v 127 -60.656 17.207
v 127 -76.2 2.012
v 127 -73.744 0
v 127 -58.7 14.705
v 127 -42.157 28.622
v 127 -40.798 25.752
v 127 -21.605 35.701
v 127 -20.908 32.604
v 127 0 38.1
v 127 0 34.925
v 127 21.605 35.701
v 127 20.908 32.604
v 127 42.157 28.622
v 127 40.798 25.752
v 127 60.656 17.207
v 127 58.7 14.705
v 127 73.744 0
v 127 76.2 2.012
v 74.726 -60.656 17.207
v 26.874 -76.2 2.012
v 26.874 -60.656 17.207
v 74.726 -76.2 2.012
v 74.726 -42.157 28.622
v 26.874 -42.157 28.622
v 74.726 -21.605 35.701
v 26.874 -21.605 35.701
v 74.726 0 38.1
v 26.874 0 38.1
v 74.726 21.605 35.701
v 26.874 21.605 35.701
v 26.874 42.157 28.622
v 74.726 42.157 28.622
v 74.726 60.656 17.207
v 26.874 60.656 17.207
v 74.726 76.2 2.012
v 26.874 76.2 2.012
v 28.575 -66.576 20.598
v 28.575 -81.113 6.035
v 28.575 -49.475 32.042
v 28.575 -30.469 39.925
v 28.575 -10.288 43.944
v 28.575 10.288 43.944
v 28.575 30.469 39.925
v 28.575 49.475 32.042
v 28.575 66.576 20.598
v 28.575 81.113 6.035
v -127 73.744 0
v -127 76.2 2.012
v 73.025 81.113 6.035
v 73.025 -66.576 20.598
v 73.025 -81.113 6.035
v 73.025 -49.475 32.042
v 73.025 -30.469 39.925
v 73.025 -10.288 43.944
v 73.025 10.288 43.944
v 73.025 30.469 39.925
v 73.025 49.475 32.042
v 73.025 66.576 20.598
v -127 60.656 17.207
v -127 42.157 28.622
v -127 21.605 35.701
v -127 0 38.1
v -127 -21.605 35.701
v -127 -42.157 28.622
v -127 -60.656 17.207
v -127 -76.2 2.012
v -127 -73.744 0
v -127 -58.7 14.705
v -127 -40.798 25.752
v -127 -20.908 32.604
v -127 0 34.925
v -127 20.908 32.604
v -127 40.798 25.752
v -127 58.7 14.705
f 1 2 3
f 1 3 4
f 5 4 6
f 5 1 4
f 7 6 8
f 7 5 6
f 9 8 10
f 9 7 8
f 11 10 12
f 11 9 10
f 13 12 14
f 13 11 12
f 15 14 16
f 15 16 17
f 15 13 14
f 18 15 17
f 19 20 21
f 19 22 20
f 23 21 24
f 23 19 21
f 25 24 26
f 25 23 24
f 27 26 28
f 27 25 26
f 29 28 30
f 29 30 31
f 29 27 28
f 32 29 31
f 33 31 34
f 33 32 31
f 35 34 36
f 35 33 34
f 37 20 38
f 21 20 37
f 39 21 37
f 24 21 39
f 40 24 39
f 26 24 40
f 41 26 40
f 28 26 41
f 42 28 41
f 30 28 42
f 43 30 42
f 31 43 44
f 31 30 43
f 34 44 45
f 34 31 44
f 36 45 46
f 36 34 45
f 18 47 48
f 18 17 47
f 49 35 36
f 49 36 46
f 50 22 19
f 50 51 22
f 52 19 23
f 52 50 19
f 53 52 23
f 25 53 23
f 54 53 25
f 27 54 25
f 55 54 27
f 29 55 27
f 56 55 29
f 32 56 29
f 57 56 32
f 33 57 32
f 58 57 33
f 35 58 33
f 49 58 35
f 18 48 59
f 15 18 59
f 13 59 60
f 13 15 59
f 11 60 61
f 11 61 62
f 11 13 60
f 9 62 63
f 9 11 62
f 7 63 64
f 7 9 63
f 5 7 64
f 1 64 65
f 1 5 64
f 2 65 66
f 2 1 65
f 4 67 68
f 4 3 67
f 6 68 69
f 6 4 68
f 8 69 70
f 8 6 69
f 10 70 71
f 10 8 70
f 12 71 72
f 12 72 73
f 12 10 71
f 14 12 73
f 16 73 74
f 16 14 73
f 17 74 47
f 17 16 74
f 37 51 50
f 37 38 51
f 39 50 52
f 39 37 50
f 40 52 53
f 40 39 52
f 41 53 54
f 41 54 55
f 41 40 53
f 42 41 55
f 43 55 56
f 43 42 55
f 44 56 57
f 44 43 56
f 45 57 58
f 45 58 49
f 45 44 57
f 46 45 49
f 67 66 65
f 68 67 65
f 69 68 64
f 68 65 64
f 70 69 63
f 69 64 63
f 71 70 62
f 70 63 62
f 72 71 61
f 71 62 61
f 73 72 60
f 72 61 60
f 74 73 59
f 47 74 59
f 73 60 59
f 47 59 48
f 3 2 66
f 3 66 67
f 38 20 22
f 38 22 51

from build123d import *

# Parameters (mm, degrees)
F1_DEPTH = 127


# Not quite as in the source:
# - a feature of the source that left no trace in its solid (it failed there, or was rolled back) is left out


with BuildPart() as f1:
    # F0 (on Right) → F1 (new body, symmetric)
    with BuildSketch(Plane.YZ):
        with BuildLine():
            ThreePointArc((0, 34.925), (40.7978992511, 25.7523970758), (73.743601134, 0))
            Line((73.743601134, 0), (76.2, 2.011648481))
            ThreePointArc((76.2, 2.011648481), (42.1568770053, 28.6218577331), (0, 38.1))
            ThreePointArc((0, 38.1), (-42.1568770053, 28.6218577331), (-76.2, 2.011648481))
            Line((-76.2, 2.011648481), (-73.743601134, 0))
            ThreePointArc((-73.743601134, 0), (-40.7978992511, 25.7523970758), (0, 34.925))
        make_face()
    extrude(amount=F1_DEPTH, both=True)


with BuildPart() as f5:
    # F5: sweep along a path in F4
    with BuildLine(Plane.YZ.offset(75.5772160579)) as f5_path:
        ThreePointArc((-76.2, 2.011648481), (0, 38.1), (76.2, 2.011648481))
    # F2 (on face) → F5 (sweep)
    with BuildSketch(Plane(origin=(0, -29.6033643096, -36.1482988732), x_dir=(1, 0, 0), z_dir=(0, -0.6335900728, -0.7736689342))):
        Polygon((73.025, 66.5781332912), (50.8, 66.5781332912), (28.575, 66.5781332912), (26.8735226281, 60.2281332912), (74.7264773719, 60.2281332912), align=None)
    sweep(path=f5_path.line)


solid = Compound([f1.part, f5.part])
